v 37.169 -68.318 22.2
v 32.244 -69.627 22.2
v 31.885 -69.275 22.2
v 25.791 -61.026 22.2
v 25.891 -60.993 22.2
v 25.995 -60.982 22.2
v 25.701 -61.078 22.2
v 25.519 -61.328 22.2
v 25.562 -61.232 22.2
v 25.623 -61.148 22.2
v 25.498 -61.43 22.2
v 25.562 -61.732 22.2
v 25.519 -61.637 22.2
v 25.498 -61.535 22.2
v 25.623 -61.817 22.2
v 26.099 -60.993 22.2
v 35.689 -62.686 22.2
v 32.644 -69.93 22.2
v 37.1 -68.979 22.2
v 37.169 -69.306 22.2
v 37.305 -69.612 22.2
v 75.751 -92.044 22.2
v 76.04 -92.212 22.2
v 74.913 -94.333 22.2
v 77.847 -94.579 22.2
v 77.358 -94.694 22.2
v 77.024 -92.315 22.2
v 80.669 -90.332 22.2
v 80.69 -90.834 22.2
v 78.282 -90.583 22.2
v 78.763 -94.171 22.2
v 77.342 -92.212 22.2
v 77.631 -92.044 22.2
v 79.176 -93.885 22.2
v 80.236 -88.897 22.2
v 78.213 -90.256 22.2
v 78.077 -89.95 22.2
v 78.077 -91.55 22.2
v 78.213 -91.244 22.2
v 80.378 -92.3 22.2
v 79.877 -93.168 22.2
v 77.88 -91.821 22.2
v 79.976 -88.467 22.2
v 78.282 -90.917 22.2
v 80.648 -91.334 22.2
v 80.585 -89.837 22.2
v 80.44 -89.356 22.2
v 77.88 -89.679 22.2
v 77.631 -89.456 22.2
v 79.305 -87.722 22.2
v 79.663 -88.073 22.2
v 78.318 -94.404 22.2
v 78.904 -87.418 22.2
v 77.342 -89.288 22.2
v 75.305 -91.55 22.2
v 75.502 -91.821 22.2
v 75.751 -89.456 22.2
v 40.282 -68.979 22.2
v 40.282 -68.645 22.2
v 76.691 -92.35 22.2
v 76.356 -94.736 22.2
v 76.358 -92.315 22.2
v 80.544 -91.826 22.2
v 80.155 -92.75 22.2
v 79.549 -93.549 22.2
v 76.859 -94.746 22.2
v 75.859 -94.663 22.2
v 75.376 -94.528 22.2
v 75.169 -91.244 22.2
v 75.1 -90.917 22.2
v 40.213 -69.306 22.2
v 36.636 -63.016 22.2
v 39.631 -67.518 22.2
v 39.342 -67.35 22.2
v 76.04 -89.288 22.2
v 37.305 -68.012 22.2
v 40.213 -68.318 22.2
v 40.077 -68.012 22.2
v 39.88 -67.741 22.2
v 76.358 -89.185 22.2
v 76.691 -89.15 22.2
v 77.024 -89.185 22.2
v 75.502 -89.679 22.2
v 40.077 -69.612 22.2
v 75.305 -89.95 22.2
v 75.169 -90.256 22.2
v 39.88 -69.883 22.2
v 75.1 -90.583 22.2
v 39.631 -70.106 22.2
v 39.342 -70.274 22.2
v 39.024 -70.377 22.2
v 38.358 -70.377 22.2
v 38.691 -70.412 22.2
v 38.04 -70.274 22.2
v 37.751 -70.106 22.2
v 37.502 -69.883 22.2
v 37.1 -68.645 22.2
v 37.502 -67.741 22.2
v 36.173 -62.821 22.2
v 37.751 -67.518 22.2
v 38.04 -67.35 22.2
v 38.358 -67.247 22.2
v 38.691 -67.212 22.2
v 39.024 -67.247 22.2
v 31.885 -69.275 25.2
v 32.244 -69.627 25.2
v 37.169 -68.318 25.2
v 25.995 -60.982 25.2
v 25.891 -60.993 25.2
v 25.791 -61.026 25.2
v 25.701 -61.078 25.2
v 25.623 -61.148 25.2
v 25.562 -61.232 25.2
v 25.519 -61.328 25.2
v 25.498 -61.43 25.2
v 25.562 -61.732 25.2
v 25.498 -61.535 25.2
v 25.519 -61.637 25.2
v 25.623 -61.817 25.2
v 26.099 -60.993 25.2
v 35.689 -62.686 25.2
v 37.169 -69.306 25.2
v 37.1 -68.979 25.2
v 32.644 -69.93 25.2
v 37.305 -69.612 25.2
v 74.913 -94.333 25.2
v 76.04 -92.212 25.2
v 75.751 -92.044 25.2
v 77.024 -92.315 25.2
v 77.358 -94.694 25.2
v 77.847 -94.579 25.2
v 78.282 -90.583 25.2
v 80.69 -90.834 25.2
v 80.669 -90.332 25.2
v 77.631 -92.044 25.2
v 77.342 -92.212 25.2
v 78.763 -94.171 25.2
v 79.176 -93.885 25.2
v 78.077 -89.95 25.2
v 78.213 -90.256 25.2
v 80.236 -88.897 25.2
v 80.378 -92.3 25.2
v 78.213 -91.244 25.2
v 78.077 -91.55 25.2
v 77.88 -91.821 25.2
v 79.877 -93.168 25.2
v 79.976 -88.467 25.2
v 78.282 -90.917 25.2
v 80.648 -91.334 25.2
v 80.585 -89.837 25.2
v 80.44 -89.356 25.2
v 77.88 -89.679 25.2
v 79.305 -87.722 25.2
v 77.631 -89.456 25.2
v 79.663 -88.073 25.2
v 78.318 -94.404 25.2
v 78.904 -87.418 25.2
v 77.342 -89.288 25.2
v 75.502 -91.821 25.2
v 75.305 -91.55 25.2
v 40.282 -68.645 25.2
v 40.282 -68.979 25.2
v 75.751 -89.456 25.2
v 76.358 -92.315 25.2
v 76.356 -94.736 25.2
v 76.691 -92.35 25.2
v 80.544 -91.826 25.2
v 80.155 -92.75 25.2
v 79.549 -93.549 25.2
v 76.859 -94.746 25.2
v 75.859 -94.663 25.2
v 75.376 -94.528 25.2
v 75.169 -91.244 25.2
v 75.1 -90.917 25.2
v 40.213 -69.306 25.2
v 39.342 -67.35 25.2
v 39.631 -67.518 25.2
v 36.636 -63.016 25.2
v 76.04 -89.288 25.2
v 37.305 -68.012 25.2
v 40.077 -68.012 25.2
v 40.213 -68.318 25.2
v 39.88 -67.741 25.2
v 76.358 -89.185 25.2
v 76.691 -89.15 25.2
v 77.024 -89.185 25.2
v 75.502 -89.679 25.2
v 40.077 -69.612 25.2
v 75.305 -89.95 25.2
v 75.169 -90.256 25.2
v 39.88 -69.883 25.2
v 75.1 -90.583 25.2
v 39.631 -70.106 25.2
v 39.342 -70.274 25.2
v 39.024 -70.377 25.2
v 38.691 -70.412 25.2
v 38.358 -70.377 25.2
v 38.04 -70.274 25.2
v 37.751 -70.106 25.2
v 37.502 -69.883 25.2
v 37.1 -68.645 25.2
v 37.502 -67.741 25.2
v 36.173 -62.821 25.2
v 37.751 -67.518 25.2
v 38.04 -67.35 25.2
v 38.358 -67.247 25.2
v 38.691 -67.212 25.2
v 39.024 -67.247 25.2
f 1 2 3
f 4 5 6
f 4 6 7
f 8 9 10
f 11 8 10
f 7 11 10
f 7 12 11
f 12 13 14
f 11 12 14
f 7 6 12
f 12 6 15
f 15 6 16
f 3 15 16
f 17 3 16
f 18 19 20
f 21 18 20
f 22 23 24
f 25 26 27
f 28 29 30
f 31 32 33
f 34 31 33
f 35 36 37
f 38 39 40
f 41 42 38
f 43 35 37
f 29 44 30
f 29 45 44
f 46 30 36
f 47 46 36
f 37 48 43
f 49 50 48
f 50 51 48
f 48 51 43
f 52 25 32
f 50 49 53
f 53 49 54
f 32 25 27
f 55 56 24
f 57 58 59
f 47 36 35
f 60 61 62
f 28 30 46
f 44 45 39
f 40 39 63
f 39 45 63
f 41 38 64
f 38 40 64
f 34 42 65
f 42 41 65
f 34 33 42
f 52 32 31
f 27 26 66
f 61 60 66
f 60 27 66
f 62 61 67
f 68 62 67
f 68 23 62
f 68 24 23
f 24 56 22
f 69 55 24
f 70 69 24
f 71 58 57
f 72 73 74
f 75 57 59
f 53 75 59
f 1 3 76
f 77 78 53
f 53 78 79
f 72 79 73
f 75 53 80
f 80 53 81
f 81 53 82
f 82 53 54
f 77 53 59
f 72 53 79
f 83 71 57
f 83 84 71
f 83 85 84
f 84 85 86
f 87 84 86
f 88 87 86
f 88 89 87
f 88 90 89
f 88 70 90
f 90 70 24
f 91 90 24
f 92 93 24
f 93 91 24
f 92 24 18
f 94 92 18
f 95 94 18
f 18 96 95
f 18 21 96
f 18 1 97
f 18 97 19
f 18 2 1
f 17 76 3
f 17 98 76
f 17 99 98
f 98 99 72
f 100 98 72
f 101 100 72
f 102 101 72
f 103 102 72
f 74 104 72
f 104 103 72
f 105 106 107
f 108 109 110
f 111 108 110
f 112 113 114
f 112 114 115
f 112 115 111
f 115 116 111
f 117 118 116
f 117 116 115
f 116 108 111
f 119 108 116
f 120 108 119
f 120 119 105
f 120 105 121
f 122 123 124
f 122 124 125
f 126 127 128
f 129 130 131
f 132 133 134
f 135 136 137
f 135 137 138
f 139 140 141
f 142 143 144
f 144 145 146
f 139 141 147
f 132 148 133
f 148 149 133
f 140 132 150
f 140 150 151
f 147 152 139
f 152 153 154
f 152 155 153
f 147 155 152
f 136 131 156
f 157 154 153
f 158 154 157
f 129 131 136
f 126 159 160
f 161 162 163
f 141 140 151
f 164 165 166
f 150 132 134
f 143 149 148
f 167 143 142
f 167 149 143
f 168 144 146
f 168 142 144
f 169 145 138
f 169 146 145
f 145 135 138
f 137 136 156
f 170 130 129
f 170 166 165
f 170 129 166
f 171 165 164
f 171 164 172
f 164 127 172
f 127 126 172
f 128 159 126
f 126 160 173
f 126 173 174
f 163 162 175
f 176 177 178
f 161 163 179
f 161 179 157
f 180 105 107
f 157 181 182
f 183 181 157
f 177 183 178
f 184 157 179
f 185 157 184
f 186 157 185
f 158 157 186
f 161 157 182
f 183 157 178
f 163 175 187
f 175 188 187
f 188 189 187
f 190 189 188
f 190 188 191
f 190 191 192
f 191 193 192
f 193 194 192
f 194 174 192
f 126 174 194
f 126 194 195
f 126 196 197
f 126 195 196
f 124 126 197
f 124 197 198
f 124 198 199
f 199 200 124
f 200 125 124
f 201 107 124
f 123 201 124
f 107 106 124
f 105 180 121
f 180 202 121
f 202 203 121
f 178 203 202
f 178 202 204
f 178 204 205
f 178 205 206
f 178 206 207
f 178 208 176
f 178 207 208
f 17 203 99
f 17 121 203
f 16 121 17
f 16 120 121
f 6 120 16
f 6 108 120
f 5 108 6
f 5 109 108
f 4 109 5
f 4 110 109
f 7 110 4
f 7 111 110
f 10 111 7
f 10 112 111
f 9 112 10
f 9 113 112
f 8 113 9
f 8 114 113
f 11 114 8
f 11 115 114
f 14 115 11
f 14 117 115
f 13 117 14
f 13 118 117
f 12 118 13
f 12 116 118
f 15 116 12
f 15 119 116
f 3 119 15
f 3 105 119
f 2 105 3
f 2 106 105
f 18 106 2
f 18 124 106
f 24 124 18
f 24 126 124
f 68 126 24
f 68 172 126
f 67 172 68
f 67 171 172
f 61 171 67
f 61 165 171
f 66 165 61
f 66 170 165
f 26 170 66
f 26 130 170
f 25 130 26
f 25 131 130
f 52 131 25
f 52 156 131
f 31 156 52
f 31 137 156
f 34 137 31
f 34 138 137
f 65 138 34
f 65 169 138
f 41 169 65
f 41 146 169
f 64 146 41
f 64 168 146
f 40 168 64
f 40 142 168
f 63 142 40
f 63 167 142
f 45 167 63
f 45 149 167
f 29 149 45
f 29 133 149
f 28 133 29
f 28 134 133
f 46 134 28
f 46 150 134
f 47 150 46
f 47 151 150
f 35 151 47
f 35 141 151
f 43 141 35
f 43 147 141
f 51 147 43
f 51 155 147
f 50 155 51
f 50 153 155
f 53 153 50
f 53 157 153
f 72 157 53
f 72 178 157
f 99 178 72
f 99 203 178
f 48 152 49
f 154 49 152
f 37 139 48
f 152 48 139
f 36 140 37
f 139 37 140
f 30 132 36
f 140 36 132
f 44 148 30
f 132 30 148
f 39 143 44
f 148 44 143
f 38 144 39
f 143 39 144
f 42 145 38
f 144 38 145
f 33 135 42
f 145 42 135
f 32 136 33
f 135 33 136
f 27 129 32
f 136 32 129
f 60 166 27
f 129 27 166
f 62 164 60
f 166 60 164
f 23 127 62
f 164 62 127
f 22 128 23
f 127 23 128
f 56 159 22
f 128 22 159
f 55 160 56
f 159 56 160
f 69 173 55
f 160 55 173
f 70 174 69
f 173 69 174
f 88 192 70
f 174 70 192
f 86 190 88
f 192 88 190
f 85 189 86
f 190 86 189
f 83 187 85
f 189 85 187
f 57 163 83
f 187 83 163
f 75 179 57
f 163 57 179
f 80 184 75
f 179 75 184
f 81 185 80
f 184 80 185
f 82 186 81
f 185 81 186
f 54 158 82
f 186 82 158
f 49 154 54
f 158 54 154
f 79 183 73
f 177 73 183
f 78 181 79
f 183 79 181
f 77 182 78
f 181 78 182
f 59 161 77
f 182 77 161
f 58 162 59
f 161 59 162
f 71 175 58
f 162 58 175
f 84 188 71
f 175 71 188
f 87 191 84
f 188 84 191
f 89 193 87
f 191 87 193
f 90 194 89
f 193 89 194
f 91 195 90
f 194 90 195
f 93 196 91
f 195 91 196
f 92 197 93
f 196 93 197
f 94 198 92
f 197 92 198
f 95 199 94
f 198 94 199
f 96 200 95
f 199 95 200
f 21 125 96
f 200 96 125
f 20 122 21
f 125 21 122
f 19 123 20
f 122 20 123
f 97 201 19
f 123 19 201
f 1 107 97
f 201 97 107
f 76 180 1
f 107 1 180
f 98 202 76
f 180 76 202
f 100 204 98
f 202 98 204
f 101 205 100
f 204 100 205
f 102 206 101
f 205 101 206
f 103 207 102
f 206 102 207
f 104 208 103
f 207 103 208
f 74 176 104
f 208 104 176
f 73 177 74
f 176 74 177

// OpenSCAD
// file: ../modules/inserts.scad
include<params.scad>;

// Hole for an M3 heat-set insert, centred on the local origin in x/y.
// faceZ: z of the face the insert is pressed in from.
// dir:   -1 when the hole goes down from that face, +1 when it goes up.
// The hole overshoots the face by 0.01 mm so the cut is clean.
module insertHole(faceZ, dir) {
    threadHole(faceZ, dir, insertDiameter);
}

// Pilot hole for an M3 screw threaded straight into the plastic, same depth
// as an insert hole.
module pilotHole(faceZ, dir) {
    threadHole(faceZ, dir, screwTapDiam);
}

module threadHole(faceZ, dir, d) {
    translate([0, 0, dir < 0 ? faceZ - insertDepth : faceZ - 0.01])
    cylinder(h = insertDepth + 0.01, d = d);
}

// Fastener descriptions read by tools/geometry_check (one ECHO line each).
// head_side: "top" when the screw goes in from above, "bottom" from below.
// flush:     true when the head must stay below the surface around it
//            (sliding faces or faces that sit on other parts).
// thread:    "insert" (heat-set insert) or "pilot" (screw threads into the plastic).
module reportJoint(name, points, head_side, head_part, insert_part, insert_face_z, insert_dir,
                   head_diam, head_height, flush, thread = "insert") {
    echo(JOINT = [name, points, head_side, head_part, insert_part, insert_face_z, insert_dir,
                  head_diam, head_height, flush, thread,
                  thread == "insert" ? insertDiameter : screwTapDiam]);
}
// file: ../modules/utils.scad
function flip(coords) = [CAM_PLATE_WIDTH - coords[0], coords[1], coords[2]];
// file: ../modules/params.scad
/*

Values in `camelCase` are user-variable (within reason); 
values like numNeedles and screwDiam, etc.,  can be modified to
accommodate user preference or hardware subsitution. 

Values in `ALL_CAPS` should be considered CONSTANTS and should
only be modified with *extreme caution* as they will affect the 
relationship between the needles and the cams, which could
prevent stitches from forming correctly.

I recommend only modifying these constants if you are also 
making changes to the cam design in the technical sketch.
*/

$fn = 50;

STANDARD_GAUGE = 4.5;
MID_GAUGE = 6.5;
BULKY_GAUGE = 9.0;

gauge = STANDARD_GAUGE; // I recommend using one of the predefined gauges above
numNeedles = 25;
tolerance = 0.2; // allows a bit of room for parts that have to fit together; adjust according to your printer's precision

// ---
// Hardware dimensions
// (actual measurements, no tolerances)
//
// Metric version: M3 socket head cap screws (ISO 4762, head 5.5 x 3.0 mm)
// threaded into M3 heat-set inserts. The upstream design used #6-32 and
// #4-40 pan head screws that self-tapped into the printed parts. Here screw
// holes are clearance holes and the thread is in an insert, except for the
// stripper plate screws (see stripperPlateInserts).

// - M3 screws (replace the #6-32 screws)
screwDiam = 3.2; // clearance hole
screwHeight = 18;
// The head diameter also sets how far the screws sit from the part edges
// (screwHeadDiam * 1.5), so it is kept from the #6-32 design: changing it
// moves every carriage screw hole.
screwHeadDiam = 6.75 + tolerance * 2;
screwHeadHeight = 3.0 + tolerance * 2;

// - M3 screws (replace the #4-40 screws)
screwDiamSm = 3.2; // clearance hole
screwHeightSm = 14.62;
screwHeadHeightSm = 3.0 + tolerance * 2;
screwHeadDiamSm = 5.68 + tolerance * 2;

// - M3 heat-set inserts
insertDiameter = 4.0; // hole diameter recommended by the insert vendor
insertLength = 5.7;
insertDepth = insertLength + 1; // the vendor recommends 1 mm of extra hole depth
insertWallMin = 1.2; // minimum plastic around an insert hole (used by the checks)
// Pilot hole for M3 screws that thread straight into the plastic
screwTapDiam = 2.5;
// Width of the curved slot in the back plate that the tension screw slides in
// (upstream: 2.96, for #4-40 screws)
tensionSlotWidth = screwDiamSm + tolerance;

// ---
// Needle dimensions
// - Brother needles
BUTT_HEIGHT = 15;
NEEDLE_WIDTH = 1.25;
NEEDLE_LEG_HEIGHT = 1.85;
HOOK_DIAM = 3.5;

// ---
// Needle Bed Zones
BACK_COVER = 45;
OOW_TRACK = 8;
B_TRACK = 42; // will divvy up working tracks (B & C position) later
C_TRACK = 0;
WORKING_TRACK = B_TRACK + C_TRACK;
HOLD_TRACK = 8;
SPONGE_BAR = 12;
COMB = 29;
NEEDLE_EXTENSION = 34.5;

// ---
// Needle bed dimensions
NEEDLE_BED_DEPTH = BACK_COVER + OOW_TRACK + WORKING_TRACK + HOLD_TRACK + SPONGE_BAR + COMB;
needleBedHeight = screwHeight + 2;
needleSlotHeight = NEEDLE_LEG_HEIGHT * 2 + screwHeadHeight;
needleSlotWidth = NEEDLE_WIDTH + 0.25; // add a small amount of clearance
combWidth = gauge*2/3; // width of cutouts for stitch formation; this gives room for the thickness of the yarn looped around the needle when it pulls back into the slot, but has to balance leaving enough material for the remaining "teeth" to not be too fragile
spongeThickness = 2.5;
spongeBarThickness = needleSlotHeight - NEEDLE_LEG_HEIGHT - spongeThickness;
YARN_DEPOSIT_Y = -155.1;
YARN_DEPOSIT_Z = -needleSlotHeight + HOOK_DIAM;
connectorOffset = 20;

screwPlacement = 3; // how many needles from edge of bed; min 2, max floor(numNeedles/2)

// ---
// Carriage dimensions
// refer to technical sketch
camHeight = BUTT_HEIGHT; // thickness of the tracks the needles ride along
// Plate behind the cams (upstream: 4). It also sets the thickness of the
// yarn feeder and of the yarn carrier cover. 6.7 = insertDepth, so the
// heat-set inserts in the back plate and in the tension cam pivots fit.
camPlateHeight = 6.7;
CAM_PLATE_WIDTH = 91 * 2;
CAM_PLATE_DEPTH = NEEDLE_BED_DEPTH - COMB + 6;

// Size of the stripper plate and of the front edge of the yarn carrier
// (feeder, cover and stripper screw row). Upstream scaled these with
// camPlateHeight, but they hold the knitting against the needlebed and must
// clear the needle hook, so they are tied to the needle and not to the cam
// plate thickness. Keep the upstream value unless the needles change.
STRIPPER_PLATE_SIZE = 4;
// Height of the bottom face of the yarn feeder above the needlebed surface
// (the top face of the stripper plate sits `tolerance` below it).
YARN_FEEDER_Z = 2;
// Plastic left under the head of the stripper plate screws, at the bottom of
// the yarn carrier cover.
stripperScrewSeat = 1.0;
// Stripper plate mount. The stripper plate is screwed up to the yarn feeder
// through a flat strip on top of its front post; the needle hook passes the
// back face of that post. Upstream the screws were 3.75 mm in front of the
// hook tip (hold position), which left 0.8 mm of wall between an insert and
// that face and only about 4 mm of contact strip. The yarn feeder, the yarn
// carrier cover and the post now reach further forward, so the screws can
// sit further from the hook, on a wider strip, with inserts.
// - y distance from the hook tip (hold position) forward to the screws
stripperScrewSetback = 6;
stripperScrewY = -(NEEDLE_BED_DEPTH + NEEDLE_EXTENSION + stripperScrewSetback);
// - plastic between the head recess of those screws and the front edge of
//   the yarn carrier cover (it breaks easily when removing print supports)
coverFrontMargin = 2;
// - thread the stripper plate screws into inserts (true) or into a pilot
//   hole in the plastic (false)
stripperPlateInserts = true;
// y of the front edge of the yarn feeder and of the yarn carrier cover
YARN_CARRIER_FRONT_Y = stripperScrewY - screwHeadDiamSm/2 - coverFrontMargin;
// how far that edge (and the front post of the stripper plate) reaches in
// front of the upstream design
STRIPPER_MOUNT_EXTENSION = -(NEEDLE_BED_DEPTH + NEEDLE_EXTENSION + STRIPPER_PLATE_SIZE + 2) - YARN_CARRIER_FRONT_Y;

// Lead-in at the outer ends of the stripper plate blade: a 45 degree chamfer
// in plan view, so the blade pushes the knitting towards the needlebed
// instead of catching it with a square end. 0 = square ends (upstream).
stripperLeadIn = 20;        // depth along y
stripperLeadInRadius = 3;   // rounding of the chamfer corners in plan view
// y of the back edge of the yarn feeder (the front edge of the back plate)
YARN_FEEDER_BACK_Y = -(NEEDLE_BED_DEPTH - COMB + 6 + tolerance);

// Tension lock. The tension pointer (tPointer) is screwed to the tension cam
// pivot and to the tension screw, so it turns with the cam. Its tip drops into
// one of the notches of a block (tensionLock) screwed on top of the back
// plate, which locks the cam at that setting. To change the setting, loosen
// the two pointer screws, lift the tip out of the notch, turn the cam, drop
// the tip into another notch and tighten the screws again.
// - tension cam rotation of each notch, in degrees (0 = the position
//   modelled, the tightest setting; the slot allows about 0 to -9)
tensionLockAngles = [0, -4.5, -9];
// - tension pointer
tPointerThickness = 3;      // also the height of the lock block
tPointerWidth = 8;          // M3 heads are 5.5 wide
tPointerLength = 60;        // pivot to the (sharp) tip
tPointerTipAngle = 40;      // included angle of the tip
tPointerTipRadius = 0.5;    // rounding of the tip
// - lock block
tensionLockDepth = 4;       // how far the tip goes into the block
tensionLockWall = 3;        // plastic behind the bottom of the notches
tensionLockClearance = tolerance;   // gap between the tip and the notch

railDepth = 8;
railHeight = 8; // ???
xOffset = 16.5;
//vCamScrews = [[34-xOffset, -90.25, 0],[58-xOffset, -74.25, 0],[86-xOffset,-90.25, 0]];

echo(needleSlotHeight);

assert(insertDiameter > screwDiam, "insertDiameter must be larger than the clearance hole");
// file: tCam.scad
include<../modules/params.scad>;
include<../modules/camplate_coords_mk2.scad>;
include<../modules/utils.scad>;
include<../modules/inserts.scad>;
//include<../modules/camPinHoles.scad>;

// height of the top face of the tension cam
function tCamTopZ() = camHeight - tolerance;
// height of the top face of the pivot (it sticks out of the back plate)
function tPivotTopZ() = tPivotCoords[2] + (camPlateHeight + 3)/2;

module tCam() {
    // adjustable tension cams
    difference() {
            linear_extrude(camHeight - (camClearance + tolerance))
            import("../../SVG/TCam_mk2.svg");

        // insert for the tension screw (upstream: a hex nut trap for a #4-40 nut)
        translate([tensionScrewCoords[0] - tCamCoords[0], tensionScrewCoords[1] - tCamCoords[1], 0])
        insertHole(tCamTopZ() - tCamCoords[2], -1);
    }
}

module tPivot(tol = 0, solid = false) {
     // pivot
    difference() {
        cylinder(camPlateHeight + 3, d = 8 + tol , center = true);
        if(solid) {
            // insert for the tension pointer screw, pressed in from the top
            insertHole((camPlateHeight + 3)/2, -1);
        }
    }
}

module tCamReport() {
    hd = screwHeadDiamSm - tolerance*2;
    hh = screwHeadHeight - tolerance*2;
    // only the left cam is modelled; the right one is printed mirrored
    reportJoint("tension pointer to pivot", [[tPivotCoords[0], tPivotCoords[1]]],
                "top", "tPointer", "tCam", tPivotTopZ(), -1, hd, hh, false);
    reportJoint("tension screw to cam", [[tensionScrewCoords[0], tensionScrewCoords[1]]],
                "top", "tPointer", "tCam", tCamTopZ(), -1, hd, hh, false);
    // for the tension checks: pivot, tension screw, a height inside the back
    // plate (to cut the slot), and screw positions along the slot
    echo(TENSION = [[tPivotCoords[0], tPivotCoords[1]], [tensionScrewCoords[0], tensionScrewCoords[1]],
                    camHeight + camPlateHeight/2,
                    [for (a = [0:-1:-9]) [tensionScrewAt(a)[0], tensionScrewAt(a)[1]]],
                    // tension lock: notch angles, z range of the pointer and
                    // of the lock block, lock screw positions (left)
                    tensionLockAngles, [tPivotTopZ(), tPivotTopZ() + tPointerThickness],
                    [camHeight + camPlateHeight, camHeight + camPlateHeight + tPointerThickness],
                    tensionLockScrewsXY()]);
}


// print 2, mirrored

translate(tCamCoords)
tCam();

translate(tPivotCoords)
tPivot(solid = true);
// file: ../modules/camplate_coords_mk2.scad
include<params.scad>;

camClearance = 2;

tCamCoords = [46.409 - xOffset, -90.875, camClearance]; // mk2
tPivotCoords = [93.191 - xOffset, -90.75, camHeight + camPlateHeight/2 - 1]; // mk2
// centre of the tension screw hole in TCam_mk2.svg (upstream had a hex nut
// trap there; the screw now goes into a heat-set insert)
tensionScrewCoords = [55.191 - xOffset, -68.812, camClearance]; // mk2
tSlotCoords = [53.62 - xOffset, -70.401, camHeight - 1]; // mk2
// Usable width of the tension slot in TSlot.svg (drawn for #4-40 screws): the
// largest screw that slides along the whole slot as the cam turns (the slot
// is not exactly centred on the arc of the screw). tSlots() in backPlate.scad
// widens it to tensionSlotWidth.
TSLOT_SVG_WIDTH = 2.85;
// Position of the tension screw when the tension cam is turned by `a` degrees
// about its pivot (0 = the position modelled here, the tightest setting).
function tensionScrewAt(a) = let (p = tPivotCoords, s = tensionScrewCoords, c = cos(a), n = sin(a))
    [p[0] + (s[0] - p[0])*c - (s[1] - p[1])*n, p[1] + (s[0] - p[0])*n + (s[1] - p[1])*c, s[2]];
frontWallCoords = [19.5 - xOffset, -97, camClearance]; // mk2
backWallCoords = [16.5 - xOffset, -67.85, camClearance]; // mk2
bumperCoords = [91.5 - xOffset, -75.85, camClearance]; // mk

// Tension pointer and lock block (see the tension lock values in params.scad).
// Both are drawn in a frame centred on the pivot, with x along the pointer
// (towards the tension screw) at the tightest setting.
function tPointerDir() = atan2(tensionScrewCoords[1] - tPivotCoords[1], tensionScrewCoords[0] - tPivotCoords[0]);
function tensionScrewRadius() = norm([tensionScrewCoords[0] - tPivotCoords[0], tensionScrewCoords[1] - tPivotCoords[1]]);
// centres of the circles whose hull is the pointer: pivot end, the end of
// the straight part and the rounded tip
function tPointerTipCentre() = tPointerLength - tPointerTipRadius / sin(tPointerTipAngle/2);
function tPointerShoulder() = tPointerTipCentre() - (tPointerWidth/2 - tPointerTipRadius) / sin(tPointerTipAngle/2);
// lock block: inner face (crests), bottom of the notches, outer face
function tensionLockInner() = tPointerLength - tensionLockDepth;
function tensionLockNotchBottom() = tPointerTipCentre() + tPointerTipRadius + tensionLockClearance;
function tensionLockOuter() = tensionLockNotchBottom() + tensionLockWall;
function tensionLockMid() = (tensionLockInner() + tensionLockOuter()) / 2;
// The block is fixed with one M3 screw at each end, into inserts in the top
// face of the back plate, beyond the reach of the pointer: tip half width at
// the inner face + 0.5 mm of slot over-travel + screw head + 0.5 mm.
function tensionLockScrewOffset() =
    let (half = (tPointerLength - tensionLockInner()) * tan(tPointerTipAngle/2) + tensionLockClearance)
    (half + 0.5 + screwHeadDiamSm/2 + 0.5) / tensionLockMid() * 180 / PI;
function tensionLockScrewAngles() = [max(tensionLockAngles) + tensionLockScrewOffset(),
                                     min(tensionLockAngles) - tensionLockScrewOffset()];
// screw positions of the left block, in assembly coordinates
function tensionLockScrewsXY() = [for (a = tensionLockScrewAngles())
    [tPivotCoords[0] + tensionLockMid() * cos(tPointerDir() + a),
     tPivotCoords[1] + tensionLockMid() * sin(tPointerDir() + a)]];

assert(tPointerShoulder() > tensionScrewRadius() + tPointerWidth/2,
       "the pointer tip starts before the tension screw: make it longer or the tip sharper");
// main file
include <../modules/camplate_coords_mk2.scad>;
use <tCam.scad>;

// Tension pointer, left side (print 2: it is symmetric about its axis, so
// the right one, placed mirrored in camplate.scad, is the same part). It is
// screwed to the pivot of the tension cam and to the tension screw, and its
// tip locks the cam in one of the notches of the tension lock block
// (tensionLock.scad).

tPointer();

// Outline in the pivot frame (pivot at the origin, pointer along +x).
// tensionLock.scad cuts the notches with this same outline.
module tPointer2D() {
    hull() {
        circle(d = tPointerWidth, $fn = 50);
        translate([tPointerShoulder(), 0]) circle(d = tPointerWidth, $fn = 50);
        translate([tPointerTipCentre(), 0]) circle(r = tPointerTipRadius, $fn = 30);
    }
}

module tPointer() {
    // it rests on top of the pivot, which sticks out of the back plate
    translate([tPivotCoords[0], tPivotCoords[1], tPivotTopZ()])
    rotate([0, 0, tPointerDir()])
    linear_extrude(tPointerThickness)
    difference() {
        tPointer2D();
        circle(d = screwDiamSm, $fn = 30);                                          // pivot screw
        translate([tensionScrewRadius(), 0]) circle(d = screwDiamSm, $fn = 30);     // tension screw
    }
}
